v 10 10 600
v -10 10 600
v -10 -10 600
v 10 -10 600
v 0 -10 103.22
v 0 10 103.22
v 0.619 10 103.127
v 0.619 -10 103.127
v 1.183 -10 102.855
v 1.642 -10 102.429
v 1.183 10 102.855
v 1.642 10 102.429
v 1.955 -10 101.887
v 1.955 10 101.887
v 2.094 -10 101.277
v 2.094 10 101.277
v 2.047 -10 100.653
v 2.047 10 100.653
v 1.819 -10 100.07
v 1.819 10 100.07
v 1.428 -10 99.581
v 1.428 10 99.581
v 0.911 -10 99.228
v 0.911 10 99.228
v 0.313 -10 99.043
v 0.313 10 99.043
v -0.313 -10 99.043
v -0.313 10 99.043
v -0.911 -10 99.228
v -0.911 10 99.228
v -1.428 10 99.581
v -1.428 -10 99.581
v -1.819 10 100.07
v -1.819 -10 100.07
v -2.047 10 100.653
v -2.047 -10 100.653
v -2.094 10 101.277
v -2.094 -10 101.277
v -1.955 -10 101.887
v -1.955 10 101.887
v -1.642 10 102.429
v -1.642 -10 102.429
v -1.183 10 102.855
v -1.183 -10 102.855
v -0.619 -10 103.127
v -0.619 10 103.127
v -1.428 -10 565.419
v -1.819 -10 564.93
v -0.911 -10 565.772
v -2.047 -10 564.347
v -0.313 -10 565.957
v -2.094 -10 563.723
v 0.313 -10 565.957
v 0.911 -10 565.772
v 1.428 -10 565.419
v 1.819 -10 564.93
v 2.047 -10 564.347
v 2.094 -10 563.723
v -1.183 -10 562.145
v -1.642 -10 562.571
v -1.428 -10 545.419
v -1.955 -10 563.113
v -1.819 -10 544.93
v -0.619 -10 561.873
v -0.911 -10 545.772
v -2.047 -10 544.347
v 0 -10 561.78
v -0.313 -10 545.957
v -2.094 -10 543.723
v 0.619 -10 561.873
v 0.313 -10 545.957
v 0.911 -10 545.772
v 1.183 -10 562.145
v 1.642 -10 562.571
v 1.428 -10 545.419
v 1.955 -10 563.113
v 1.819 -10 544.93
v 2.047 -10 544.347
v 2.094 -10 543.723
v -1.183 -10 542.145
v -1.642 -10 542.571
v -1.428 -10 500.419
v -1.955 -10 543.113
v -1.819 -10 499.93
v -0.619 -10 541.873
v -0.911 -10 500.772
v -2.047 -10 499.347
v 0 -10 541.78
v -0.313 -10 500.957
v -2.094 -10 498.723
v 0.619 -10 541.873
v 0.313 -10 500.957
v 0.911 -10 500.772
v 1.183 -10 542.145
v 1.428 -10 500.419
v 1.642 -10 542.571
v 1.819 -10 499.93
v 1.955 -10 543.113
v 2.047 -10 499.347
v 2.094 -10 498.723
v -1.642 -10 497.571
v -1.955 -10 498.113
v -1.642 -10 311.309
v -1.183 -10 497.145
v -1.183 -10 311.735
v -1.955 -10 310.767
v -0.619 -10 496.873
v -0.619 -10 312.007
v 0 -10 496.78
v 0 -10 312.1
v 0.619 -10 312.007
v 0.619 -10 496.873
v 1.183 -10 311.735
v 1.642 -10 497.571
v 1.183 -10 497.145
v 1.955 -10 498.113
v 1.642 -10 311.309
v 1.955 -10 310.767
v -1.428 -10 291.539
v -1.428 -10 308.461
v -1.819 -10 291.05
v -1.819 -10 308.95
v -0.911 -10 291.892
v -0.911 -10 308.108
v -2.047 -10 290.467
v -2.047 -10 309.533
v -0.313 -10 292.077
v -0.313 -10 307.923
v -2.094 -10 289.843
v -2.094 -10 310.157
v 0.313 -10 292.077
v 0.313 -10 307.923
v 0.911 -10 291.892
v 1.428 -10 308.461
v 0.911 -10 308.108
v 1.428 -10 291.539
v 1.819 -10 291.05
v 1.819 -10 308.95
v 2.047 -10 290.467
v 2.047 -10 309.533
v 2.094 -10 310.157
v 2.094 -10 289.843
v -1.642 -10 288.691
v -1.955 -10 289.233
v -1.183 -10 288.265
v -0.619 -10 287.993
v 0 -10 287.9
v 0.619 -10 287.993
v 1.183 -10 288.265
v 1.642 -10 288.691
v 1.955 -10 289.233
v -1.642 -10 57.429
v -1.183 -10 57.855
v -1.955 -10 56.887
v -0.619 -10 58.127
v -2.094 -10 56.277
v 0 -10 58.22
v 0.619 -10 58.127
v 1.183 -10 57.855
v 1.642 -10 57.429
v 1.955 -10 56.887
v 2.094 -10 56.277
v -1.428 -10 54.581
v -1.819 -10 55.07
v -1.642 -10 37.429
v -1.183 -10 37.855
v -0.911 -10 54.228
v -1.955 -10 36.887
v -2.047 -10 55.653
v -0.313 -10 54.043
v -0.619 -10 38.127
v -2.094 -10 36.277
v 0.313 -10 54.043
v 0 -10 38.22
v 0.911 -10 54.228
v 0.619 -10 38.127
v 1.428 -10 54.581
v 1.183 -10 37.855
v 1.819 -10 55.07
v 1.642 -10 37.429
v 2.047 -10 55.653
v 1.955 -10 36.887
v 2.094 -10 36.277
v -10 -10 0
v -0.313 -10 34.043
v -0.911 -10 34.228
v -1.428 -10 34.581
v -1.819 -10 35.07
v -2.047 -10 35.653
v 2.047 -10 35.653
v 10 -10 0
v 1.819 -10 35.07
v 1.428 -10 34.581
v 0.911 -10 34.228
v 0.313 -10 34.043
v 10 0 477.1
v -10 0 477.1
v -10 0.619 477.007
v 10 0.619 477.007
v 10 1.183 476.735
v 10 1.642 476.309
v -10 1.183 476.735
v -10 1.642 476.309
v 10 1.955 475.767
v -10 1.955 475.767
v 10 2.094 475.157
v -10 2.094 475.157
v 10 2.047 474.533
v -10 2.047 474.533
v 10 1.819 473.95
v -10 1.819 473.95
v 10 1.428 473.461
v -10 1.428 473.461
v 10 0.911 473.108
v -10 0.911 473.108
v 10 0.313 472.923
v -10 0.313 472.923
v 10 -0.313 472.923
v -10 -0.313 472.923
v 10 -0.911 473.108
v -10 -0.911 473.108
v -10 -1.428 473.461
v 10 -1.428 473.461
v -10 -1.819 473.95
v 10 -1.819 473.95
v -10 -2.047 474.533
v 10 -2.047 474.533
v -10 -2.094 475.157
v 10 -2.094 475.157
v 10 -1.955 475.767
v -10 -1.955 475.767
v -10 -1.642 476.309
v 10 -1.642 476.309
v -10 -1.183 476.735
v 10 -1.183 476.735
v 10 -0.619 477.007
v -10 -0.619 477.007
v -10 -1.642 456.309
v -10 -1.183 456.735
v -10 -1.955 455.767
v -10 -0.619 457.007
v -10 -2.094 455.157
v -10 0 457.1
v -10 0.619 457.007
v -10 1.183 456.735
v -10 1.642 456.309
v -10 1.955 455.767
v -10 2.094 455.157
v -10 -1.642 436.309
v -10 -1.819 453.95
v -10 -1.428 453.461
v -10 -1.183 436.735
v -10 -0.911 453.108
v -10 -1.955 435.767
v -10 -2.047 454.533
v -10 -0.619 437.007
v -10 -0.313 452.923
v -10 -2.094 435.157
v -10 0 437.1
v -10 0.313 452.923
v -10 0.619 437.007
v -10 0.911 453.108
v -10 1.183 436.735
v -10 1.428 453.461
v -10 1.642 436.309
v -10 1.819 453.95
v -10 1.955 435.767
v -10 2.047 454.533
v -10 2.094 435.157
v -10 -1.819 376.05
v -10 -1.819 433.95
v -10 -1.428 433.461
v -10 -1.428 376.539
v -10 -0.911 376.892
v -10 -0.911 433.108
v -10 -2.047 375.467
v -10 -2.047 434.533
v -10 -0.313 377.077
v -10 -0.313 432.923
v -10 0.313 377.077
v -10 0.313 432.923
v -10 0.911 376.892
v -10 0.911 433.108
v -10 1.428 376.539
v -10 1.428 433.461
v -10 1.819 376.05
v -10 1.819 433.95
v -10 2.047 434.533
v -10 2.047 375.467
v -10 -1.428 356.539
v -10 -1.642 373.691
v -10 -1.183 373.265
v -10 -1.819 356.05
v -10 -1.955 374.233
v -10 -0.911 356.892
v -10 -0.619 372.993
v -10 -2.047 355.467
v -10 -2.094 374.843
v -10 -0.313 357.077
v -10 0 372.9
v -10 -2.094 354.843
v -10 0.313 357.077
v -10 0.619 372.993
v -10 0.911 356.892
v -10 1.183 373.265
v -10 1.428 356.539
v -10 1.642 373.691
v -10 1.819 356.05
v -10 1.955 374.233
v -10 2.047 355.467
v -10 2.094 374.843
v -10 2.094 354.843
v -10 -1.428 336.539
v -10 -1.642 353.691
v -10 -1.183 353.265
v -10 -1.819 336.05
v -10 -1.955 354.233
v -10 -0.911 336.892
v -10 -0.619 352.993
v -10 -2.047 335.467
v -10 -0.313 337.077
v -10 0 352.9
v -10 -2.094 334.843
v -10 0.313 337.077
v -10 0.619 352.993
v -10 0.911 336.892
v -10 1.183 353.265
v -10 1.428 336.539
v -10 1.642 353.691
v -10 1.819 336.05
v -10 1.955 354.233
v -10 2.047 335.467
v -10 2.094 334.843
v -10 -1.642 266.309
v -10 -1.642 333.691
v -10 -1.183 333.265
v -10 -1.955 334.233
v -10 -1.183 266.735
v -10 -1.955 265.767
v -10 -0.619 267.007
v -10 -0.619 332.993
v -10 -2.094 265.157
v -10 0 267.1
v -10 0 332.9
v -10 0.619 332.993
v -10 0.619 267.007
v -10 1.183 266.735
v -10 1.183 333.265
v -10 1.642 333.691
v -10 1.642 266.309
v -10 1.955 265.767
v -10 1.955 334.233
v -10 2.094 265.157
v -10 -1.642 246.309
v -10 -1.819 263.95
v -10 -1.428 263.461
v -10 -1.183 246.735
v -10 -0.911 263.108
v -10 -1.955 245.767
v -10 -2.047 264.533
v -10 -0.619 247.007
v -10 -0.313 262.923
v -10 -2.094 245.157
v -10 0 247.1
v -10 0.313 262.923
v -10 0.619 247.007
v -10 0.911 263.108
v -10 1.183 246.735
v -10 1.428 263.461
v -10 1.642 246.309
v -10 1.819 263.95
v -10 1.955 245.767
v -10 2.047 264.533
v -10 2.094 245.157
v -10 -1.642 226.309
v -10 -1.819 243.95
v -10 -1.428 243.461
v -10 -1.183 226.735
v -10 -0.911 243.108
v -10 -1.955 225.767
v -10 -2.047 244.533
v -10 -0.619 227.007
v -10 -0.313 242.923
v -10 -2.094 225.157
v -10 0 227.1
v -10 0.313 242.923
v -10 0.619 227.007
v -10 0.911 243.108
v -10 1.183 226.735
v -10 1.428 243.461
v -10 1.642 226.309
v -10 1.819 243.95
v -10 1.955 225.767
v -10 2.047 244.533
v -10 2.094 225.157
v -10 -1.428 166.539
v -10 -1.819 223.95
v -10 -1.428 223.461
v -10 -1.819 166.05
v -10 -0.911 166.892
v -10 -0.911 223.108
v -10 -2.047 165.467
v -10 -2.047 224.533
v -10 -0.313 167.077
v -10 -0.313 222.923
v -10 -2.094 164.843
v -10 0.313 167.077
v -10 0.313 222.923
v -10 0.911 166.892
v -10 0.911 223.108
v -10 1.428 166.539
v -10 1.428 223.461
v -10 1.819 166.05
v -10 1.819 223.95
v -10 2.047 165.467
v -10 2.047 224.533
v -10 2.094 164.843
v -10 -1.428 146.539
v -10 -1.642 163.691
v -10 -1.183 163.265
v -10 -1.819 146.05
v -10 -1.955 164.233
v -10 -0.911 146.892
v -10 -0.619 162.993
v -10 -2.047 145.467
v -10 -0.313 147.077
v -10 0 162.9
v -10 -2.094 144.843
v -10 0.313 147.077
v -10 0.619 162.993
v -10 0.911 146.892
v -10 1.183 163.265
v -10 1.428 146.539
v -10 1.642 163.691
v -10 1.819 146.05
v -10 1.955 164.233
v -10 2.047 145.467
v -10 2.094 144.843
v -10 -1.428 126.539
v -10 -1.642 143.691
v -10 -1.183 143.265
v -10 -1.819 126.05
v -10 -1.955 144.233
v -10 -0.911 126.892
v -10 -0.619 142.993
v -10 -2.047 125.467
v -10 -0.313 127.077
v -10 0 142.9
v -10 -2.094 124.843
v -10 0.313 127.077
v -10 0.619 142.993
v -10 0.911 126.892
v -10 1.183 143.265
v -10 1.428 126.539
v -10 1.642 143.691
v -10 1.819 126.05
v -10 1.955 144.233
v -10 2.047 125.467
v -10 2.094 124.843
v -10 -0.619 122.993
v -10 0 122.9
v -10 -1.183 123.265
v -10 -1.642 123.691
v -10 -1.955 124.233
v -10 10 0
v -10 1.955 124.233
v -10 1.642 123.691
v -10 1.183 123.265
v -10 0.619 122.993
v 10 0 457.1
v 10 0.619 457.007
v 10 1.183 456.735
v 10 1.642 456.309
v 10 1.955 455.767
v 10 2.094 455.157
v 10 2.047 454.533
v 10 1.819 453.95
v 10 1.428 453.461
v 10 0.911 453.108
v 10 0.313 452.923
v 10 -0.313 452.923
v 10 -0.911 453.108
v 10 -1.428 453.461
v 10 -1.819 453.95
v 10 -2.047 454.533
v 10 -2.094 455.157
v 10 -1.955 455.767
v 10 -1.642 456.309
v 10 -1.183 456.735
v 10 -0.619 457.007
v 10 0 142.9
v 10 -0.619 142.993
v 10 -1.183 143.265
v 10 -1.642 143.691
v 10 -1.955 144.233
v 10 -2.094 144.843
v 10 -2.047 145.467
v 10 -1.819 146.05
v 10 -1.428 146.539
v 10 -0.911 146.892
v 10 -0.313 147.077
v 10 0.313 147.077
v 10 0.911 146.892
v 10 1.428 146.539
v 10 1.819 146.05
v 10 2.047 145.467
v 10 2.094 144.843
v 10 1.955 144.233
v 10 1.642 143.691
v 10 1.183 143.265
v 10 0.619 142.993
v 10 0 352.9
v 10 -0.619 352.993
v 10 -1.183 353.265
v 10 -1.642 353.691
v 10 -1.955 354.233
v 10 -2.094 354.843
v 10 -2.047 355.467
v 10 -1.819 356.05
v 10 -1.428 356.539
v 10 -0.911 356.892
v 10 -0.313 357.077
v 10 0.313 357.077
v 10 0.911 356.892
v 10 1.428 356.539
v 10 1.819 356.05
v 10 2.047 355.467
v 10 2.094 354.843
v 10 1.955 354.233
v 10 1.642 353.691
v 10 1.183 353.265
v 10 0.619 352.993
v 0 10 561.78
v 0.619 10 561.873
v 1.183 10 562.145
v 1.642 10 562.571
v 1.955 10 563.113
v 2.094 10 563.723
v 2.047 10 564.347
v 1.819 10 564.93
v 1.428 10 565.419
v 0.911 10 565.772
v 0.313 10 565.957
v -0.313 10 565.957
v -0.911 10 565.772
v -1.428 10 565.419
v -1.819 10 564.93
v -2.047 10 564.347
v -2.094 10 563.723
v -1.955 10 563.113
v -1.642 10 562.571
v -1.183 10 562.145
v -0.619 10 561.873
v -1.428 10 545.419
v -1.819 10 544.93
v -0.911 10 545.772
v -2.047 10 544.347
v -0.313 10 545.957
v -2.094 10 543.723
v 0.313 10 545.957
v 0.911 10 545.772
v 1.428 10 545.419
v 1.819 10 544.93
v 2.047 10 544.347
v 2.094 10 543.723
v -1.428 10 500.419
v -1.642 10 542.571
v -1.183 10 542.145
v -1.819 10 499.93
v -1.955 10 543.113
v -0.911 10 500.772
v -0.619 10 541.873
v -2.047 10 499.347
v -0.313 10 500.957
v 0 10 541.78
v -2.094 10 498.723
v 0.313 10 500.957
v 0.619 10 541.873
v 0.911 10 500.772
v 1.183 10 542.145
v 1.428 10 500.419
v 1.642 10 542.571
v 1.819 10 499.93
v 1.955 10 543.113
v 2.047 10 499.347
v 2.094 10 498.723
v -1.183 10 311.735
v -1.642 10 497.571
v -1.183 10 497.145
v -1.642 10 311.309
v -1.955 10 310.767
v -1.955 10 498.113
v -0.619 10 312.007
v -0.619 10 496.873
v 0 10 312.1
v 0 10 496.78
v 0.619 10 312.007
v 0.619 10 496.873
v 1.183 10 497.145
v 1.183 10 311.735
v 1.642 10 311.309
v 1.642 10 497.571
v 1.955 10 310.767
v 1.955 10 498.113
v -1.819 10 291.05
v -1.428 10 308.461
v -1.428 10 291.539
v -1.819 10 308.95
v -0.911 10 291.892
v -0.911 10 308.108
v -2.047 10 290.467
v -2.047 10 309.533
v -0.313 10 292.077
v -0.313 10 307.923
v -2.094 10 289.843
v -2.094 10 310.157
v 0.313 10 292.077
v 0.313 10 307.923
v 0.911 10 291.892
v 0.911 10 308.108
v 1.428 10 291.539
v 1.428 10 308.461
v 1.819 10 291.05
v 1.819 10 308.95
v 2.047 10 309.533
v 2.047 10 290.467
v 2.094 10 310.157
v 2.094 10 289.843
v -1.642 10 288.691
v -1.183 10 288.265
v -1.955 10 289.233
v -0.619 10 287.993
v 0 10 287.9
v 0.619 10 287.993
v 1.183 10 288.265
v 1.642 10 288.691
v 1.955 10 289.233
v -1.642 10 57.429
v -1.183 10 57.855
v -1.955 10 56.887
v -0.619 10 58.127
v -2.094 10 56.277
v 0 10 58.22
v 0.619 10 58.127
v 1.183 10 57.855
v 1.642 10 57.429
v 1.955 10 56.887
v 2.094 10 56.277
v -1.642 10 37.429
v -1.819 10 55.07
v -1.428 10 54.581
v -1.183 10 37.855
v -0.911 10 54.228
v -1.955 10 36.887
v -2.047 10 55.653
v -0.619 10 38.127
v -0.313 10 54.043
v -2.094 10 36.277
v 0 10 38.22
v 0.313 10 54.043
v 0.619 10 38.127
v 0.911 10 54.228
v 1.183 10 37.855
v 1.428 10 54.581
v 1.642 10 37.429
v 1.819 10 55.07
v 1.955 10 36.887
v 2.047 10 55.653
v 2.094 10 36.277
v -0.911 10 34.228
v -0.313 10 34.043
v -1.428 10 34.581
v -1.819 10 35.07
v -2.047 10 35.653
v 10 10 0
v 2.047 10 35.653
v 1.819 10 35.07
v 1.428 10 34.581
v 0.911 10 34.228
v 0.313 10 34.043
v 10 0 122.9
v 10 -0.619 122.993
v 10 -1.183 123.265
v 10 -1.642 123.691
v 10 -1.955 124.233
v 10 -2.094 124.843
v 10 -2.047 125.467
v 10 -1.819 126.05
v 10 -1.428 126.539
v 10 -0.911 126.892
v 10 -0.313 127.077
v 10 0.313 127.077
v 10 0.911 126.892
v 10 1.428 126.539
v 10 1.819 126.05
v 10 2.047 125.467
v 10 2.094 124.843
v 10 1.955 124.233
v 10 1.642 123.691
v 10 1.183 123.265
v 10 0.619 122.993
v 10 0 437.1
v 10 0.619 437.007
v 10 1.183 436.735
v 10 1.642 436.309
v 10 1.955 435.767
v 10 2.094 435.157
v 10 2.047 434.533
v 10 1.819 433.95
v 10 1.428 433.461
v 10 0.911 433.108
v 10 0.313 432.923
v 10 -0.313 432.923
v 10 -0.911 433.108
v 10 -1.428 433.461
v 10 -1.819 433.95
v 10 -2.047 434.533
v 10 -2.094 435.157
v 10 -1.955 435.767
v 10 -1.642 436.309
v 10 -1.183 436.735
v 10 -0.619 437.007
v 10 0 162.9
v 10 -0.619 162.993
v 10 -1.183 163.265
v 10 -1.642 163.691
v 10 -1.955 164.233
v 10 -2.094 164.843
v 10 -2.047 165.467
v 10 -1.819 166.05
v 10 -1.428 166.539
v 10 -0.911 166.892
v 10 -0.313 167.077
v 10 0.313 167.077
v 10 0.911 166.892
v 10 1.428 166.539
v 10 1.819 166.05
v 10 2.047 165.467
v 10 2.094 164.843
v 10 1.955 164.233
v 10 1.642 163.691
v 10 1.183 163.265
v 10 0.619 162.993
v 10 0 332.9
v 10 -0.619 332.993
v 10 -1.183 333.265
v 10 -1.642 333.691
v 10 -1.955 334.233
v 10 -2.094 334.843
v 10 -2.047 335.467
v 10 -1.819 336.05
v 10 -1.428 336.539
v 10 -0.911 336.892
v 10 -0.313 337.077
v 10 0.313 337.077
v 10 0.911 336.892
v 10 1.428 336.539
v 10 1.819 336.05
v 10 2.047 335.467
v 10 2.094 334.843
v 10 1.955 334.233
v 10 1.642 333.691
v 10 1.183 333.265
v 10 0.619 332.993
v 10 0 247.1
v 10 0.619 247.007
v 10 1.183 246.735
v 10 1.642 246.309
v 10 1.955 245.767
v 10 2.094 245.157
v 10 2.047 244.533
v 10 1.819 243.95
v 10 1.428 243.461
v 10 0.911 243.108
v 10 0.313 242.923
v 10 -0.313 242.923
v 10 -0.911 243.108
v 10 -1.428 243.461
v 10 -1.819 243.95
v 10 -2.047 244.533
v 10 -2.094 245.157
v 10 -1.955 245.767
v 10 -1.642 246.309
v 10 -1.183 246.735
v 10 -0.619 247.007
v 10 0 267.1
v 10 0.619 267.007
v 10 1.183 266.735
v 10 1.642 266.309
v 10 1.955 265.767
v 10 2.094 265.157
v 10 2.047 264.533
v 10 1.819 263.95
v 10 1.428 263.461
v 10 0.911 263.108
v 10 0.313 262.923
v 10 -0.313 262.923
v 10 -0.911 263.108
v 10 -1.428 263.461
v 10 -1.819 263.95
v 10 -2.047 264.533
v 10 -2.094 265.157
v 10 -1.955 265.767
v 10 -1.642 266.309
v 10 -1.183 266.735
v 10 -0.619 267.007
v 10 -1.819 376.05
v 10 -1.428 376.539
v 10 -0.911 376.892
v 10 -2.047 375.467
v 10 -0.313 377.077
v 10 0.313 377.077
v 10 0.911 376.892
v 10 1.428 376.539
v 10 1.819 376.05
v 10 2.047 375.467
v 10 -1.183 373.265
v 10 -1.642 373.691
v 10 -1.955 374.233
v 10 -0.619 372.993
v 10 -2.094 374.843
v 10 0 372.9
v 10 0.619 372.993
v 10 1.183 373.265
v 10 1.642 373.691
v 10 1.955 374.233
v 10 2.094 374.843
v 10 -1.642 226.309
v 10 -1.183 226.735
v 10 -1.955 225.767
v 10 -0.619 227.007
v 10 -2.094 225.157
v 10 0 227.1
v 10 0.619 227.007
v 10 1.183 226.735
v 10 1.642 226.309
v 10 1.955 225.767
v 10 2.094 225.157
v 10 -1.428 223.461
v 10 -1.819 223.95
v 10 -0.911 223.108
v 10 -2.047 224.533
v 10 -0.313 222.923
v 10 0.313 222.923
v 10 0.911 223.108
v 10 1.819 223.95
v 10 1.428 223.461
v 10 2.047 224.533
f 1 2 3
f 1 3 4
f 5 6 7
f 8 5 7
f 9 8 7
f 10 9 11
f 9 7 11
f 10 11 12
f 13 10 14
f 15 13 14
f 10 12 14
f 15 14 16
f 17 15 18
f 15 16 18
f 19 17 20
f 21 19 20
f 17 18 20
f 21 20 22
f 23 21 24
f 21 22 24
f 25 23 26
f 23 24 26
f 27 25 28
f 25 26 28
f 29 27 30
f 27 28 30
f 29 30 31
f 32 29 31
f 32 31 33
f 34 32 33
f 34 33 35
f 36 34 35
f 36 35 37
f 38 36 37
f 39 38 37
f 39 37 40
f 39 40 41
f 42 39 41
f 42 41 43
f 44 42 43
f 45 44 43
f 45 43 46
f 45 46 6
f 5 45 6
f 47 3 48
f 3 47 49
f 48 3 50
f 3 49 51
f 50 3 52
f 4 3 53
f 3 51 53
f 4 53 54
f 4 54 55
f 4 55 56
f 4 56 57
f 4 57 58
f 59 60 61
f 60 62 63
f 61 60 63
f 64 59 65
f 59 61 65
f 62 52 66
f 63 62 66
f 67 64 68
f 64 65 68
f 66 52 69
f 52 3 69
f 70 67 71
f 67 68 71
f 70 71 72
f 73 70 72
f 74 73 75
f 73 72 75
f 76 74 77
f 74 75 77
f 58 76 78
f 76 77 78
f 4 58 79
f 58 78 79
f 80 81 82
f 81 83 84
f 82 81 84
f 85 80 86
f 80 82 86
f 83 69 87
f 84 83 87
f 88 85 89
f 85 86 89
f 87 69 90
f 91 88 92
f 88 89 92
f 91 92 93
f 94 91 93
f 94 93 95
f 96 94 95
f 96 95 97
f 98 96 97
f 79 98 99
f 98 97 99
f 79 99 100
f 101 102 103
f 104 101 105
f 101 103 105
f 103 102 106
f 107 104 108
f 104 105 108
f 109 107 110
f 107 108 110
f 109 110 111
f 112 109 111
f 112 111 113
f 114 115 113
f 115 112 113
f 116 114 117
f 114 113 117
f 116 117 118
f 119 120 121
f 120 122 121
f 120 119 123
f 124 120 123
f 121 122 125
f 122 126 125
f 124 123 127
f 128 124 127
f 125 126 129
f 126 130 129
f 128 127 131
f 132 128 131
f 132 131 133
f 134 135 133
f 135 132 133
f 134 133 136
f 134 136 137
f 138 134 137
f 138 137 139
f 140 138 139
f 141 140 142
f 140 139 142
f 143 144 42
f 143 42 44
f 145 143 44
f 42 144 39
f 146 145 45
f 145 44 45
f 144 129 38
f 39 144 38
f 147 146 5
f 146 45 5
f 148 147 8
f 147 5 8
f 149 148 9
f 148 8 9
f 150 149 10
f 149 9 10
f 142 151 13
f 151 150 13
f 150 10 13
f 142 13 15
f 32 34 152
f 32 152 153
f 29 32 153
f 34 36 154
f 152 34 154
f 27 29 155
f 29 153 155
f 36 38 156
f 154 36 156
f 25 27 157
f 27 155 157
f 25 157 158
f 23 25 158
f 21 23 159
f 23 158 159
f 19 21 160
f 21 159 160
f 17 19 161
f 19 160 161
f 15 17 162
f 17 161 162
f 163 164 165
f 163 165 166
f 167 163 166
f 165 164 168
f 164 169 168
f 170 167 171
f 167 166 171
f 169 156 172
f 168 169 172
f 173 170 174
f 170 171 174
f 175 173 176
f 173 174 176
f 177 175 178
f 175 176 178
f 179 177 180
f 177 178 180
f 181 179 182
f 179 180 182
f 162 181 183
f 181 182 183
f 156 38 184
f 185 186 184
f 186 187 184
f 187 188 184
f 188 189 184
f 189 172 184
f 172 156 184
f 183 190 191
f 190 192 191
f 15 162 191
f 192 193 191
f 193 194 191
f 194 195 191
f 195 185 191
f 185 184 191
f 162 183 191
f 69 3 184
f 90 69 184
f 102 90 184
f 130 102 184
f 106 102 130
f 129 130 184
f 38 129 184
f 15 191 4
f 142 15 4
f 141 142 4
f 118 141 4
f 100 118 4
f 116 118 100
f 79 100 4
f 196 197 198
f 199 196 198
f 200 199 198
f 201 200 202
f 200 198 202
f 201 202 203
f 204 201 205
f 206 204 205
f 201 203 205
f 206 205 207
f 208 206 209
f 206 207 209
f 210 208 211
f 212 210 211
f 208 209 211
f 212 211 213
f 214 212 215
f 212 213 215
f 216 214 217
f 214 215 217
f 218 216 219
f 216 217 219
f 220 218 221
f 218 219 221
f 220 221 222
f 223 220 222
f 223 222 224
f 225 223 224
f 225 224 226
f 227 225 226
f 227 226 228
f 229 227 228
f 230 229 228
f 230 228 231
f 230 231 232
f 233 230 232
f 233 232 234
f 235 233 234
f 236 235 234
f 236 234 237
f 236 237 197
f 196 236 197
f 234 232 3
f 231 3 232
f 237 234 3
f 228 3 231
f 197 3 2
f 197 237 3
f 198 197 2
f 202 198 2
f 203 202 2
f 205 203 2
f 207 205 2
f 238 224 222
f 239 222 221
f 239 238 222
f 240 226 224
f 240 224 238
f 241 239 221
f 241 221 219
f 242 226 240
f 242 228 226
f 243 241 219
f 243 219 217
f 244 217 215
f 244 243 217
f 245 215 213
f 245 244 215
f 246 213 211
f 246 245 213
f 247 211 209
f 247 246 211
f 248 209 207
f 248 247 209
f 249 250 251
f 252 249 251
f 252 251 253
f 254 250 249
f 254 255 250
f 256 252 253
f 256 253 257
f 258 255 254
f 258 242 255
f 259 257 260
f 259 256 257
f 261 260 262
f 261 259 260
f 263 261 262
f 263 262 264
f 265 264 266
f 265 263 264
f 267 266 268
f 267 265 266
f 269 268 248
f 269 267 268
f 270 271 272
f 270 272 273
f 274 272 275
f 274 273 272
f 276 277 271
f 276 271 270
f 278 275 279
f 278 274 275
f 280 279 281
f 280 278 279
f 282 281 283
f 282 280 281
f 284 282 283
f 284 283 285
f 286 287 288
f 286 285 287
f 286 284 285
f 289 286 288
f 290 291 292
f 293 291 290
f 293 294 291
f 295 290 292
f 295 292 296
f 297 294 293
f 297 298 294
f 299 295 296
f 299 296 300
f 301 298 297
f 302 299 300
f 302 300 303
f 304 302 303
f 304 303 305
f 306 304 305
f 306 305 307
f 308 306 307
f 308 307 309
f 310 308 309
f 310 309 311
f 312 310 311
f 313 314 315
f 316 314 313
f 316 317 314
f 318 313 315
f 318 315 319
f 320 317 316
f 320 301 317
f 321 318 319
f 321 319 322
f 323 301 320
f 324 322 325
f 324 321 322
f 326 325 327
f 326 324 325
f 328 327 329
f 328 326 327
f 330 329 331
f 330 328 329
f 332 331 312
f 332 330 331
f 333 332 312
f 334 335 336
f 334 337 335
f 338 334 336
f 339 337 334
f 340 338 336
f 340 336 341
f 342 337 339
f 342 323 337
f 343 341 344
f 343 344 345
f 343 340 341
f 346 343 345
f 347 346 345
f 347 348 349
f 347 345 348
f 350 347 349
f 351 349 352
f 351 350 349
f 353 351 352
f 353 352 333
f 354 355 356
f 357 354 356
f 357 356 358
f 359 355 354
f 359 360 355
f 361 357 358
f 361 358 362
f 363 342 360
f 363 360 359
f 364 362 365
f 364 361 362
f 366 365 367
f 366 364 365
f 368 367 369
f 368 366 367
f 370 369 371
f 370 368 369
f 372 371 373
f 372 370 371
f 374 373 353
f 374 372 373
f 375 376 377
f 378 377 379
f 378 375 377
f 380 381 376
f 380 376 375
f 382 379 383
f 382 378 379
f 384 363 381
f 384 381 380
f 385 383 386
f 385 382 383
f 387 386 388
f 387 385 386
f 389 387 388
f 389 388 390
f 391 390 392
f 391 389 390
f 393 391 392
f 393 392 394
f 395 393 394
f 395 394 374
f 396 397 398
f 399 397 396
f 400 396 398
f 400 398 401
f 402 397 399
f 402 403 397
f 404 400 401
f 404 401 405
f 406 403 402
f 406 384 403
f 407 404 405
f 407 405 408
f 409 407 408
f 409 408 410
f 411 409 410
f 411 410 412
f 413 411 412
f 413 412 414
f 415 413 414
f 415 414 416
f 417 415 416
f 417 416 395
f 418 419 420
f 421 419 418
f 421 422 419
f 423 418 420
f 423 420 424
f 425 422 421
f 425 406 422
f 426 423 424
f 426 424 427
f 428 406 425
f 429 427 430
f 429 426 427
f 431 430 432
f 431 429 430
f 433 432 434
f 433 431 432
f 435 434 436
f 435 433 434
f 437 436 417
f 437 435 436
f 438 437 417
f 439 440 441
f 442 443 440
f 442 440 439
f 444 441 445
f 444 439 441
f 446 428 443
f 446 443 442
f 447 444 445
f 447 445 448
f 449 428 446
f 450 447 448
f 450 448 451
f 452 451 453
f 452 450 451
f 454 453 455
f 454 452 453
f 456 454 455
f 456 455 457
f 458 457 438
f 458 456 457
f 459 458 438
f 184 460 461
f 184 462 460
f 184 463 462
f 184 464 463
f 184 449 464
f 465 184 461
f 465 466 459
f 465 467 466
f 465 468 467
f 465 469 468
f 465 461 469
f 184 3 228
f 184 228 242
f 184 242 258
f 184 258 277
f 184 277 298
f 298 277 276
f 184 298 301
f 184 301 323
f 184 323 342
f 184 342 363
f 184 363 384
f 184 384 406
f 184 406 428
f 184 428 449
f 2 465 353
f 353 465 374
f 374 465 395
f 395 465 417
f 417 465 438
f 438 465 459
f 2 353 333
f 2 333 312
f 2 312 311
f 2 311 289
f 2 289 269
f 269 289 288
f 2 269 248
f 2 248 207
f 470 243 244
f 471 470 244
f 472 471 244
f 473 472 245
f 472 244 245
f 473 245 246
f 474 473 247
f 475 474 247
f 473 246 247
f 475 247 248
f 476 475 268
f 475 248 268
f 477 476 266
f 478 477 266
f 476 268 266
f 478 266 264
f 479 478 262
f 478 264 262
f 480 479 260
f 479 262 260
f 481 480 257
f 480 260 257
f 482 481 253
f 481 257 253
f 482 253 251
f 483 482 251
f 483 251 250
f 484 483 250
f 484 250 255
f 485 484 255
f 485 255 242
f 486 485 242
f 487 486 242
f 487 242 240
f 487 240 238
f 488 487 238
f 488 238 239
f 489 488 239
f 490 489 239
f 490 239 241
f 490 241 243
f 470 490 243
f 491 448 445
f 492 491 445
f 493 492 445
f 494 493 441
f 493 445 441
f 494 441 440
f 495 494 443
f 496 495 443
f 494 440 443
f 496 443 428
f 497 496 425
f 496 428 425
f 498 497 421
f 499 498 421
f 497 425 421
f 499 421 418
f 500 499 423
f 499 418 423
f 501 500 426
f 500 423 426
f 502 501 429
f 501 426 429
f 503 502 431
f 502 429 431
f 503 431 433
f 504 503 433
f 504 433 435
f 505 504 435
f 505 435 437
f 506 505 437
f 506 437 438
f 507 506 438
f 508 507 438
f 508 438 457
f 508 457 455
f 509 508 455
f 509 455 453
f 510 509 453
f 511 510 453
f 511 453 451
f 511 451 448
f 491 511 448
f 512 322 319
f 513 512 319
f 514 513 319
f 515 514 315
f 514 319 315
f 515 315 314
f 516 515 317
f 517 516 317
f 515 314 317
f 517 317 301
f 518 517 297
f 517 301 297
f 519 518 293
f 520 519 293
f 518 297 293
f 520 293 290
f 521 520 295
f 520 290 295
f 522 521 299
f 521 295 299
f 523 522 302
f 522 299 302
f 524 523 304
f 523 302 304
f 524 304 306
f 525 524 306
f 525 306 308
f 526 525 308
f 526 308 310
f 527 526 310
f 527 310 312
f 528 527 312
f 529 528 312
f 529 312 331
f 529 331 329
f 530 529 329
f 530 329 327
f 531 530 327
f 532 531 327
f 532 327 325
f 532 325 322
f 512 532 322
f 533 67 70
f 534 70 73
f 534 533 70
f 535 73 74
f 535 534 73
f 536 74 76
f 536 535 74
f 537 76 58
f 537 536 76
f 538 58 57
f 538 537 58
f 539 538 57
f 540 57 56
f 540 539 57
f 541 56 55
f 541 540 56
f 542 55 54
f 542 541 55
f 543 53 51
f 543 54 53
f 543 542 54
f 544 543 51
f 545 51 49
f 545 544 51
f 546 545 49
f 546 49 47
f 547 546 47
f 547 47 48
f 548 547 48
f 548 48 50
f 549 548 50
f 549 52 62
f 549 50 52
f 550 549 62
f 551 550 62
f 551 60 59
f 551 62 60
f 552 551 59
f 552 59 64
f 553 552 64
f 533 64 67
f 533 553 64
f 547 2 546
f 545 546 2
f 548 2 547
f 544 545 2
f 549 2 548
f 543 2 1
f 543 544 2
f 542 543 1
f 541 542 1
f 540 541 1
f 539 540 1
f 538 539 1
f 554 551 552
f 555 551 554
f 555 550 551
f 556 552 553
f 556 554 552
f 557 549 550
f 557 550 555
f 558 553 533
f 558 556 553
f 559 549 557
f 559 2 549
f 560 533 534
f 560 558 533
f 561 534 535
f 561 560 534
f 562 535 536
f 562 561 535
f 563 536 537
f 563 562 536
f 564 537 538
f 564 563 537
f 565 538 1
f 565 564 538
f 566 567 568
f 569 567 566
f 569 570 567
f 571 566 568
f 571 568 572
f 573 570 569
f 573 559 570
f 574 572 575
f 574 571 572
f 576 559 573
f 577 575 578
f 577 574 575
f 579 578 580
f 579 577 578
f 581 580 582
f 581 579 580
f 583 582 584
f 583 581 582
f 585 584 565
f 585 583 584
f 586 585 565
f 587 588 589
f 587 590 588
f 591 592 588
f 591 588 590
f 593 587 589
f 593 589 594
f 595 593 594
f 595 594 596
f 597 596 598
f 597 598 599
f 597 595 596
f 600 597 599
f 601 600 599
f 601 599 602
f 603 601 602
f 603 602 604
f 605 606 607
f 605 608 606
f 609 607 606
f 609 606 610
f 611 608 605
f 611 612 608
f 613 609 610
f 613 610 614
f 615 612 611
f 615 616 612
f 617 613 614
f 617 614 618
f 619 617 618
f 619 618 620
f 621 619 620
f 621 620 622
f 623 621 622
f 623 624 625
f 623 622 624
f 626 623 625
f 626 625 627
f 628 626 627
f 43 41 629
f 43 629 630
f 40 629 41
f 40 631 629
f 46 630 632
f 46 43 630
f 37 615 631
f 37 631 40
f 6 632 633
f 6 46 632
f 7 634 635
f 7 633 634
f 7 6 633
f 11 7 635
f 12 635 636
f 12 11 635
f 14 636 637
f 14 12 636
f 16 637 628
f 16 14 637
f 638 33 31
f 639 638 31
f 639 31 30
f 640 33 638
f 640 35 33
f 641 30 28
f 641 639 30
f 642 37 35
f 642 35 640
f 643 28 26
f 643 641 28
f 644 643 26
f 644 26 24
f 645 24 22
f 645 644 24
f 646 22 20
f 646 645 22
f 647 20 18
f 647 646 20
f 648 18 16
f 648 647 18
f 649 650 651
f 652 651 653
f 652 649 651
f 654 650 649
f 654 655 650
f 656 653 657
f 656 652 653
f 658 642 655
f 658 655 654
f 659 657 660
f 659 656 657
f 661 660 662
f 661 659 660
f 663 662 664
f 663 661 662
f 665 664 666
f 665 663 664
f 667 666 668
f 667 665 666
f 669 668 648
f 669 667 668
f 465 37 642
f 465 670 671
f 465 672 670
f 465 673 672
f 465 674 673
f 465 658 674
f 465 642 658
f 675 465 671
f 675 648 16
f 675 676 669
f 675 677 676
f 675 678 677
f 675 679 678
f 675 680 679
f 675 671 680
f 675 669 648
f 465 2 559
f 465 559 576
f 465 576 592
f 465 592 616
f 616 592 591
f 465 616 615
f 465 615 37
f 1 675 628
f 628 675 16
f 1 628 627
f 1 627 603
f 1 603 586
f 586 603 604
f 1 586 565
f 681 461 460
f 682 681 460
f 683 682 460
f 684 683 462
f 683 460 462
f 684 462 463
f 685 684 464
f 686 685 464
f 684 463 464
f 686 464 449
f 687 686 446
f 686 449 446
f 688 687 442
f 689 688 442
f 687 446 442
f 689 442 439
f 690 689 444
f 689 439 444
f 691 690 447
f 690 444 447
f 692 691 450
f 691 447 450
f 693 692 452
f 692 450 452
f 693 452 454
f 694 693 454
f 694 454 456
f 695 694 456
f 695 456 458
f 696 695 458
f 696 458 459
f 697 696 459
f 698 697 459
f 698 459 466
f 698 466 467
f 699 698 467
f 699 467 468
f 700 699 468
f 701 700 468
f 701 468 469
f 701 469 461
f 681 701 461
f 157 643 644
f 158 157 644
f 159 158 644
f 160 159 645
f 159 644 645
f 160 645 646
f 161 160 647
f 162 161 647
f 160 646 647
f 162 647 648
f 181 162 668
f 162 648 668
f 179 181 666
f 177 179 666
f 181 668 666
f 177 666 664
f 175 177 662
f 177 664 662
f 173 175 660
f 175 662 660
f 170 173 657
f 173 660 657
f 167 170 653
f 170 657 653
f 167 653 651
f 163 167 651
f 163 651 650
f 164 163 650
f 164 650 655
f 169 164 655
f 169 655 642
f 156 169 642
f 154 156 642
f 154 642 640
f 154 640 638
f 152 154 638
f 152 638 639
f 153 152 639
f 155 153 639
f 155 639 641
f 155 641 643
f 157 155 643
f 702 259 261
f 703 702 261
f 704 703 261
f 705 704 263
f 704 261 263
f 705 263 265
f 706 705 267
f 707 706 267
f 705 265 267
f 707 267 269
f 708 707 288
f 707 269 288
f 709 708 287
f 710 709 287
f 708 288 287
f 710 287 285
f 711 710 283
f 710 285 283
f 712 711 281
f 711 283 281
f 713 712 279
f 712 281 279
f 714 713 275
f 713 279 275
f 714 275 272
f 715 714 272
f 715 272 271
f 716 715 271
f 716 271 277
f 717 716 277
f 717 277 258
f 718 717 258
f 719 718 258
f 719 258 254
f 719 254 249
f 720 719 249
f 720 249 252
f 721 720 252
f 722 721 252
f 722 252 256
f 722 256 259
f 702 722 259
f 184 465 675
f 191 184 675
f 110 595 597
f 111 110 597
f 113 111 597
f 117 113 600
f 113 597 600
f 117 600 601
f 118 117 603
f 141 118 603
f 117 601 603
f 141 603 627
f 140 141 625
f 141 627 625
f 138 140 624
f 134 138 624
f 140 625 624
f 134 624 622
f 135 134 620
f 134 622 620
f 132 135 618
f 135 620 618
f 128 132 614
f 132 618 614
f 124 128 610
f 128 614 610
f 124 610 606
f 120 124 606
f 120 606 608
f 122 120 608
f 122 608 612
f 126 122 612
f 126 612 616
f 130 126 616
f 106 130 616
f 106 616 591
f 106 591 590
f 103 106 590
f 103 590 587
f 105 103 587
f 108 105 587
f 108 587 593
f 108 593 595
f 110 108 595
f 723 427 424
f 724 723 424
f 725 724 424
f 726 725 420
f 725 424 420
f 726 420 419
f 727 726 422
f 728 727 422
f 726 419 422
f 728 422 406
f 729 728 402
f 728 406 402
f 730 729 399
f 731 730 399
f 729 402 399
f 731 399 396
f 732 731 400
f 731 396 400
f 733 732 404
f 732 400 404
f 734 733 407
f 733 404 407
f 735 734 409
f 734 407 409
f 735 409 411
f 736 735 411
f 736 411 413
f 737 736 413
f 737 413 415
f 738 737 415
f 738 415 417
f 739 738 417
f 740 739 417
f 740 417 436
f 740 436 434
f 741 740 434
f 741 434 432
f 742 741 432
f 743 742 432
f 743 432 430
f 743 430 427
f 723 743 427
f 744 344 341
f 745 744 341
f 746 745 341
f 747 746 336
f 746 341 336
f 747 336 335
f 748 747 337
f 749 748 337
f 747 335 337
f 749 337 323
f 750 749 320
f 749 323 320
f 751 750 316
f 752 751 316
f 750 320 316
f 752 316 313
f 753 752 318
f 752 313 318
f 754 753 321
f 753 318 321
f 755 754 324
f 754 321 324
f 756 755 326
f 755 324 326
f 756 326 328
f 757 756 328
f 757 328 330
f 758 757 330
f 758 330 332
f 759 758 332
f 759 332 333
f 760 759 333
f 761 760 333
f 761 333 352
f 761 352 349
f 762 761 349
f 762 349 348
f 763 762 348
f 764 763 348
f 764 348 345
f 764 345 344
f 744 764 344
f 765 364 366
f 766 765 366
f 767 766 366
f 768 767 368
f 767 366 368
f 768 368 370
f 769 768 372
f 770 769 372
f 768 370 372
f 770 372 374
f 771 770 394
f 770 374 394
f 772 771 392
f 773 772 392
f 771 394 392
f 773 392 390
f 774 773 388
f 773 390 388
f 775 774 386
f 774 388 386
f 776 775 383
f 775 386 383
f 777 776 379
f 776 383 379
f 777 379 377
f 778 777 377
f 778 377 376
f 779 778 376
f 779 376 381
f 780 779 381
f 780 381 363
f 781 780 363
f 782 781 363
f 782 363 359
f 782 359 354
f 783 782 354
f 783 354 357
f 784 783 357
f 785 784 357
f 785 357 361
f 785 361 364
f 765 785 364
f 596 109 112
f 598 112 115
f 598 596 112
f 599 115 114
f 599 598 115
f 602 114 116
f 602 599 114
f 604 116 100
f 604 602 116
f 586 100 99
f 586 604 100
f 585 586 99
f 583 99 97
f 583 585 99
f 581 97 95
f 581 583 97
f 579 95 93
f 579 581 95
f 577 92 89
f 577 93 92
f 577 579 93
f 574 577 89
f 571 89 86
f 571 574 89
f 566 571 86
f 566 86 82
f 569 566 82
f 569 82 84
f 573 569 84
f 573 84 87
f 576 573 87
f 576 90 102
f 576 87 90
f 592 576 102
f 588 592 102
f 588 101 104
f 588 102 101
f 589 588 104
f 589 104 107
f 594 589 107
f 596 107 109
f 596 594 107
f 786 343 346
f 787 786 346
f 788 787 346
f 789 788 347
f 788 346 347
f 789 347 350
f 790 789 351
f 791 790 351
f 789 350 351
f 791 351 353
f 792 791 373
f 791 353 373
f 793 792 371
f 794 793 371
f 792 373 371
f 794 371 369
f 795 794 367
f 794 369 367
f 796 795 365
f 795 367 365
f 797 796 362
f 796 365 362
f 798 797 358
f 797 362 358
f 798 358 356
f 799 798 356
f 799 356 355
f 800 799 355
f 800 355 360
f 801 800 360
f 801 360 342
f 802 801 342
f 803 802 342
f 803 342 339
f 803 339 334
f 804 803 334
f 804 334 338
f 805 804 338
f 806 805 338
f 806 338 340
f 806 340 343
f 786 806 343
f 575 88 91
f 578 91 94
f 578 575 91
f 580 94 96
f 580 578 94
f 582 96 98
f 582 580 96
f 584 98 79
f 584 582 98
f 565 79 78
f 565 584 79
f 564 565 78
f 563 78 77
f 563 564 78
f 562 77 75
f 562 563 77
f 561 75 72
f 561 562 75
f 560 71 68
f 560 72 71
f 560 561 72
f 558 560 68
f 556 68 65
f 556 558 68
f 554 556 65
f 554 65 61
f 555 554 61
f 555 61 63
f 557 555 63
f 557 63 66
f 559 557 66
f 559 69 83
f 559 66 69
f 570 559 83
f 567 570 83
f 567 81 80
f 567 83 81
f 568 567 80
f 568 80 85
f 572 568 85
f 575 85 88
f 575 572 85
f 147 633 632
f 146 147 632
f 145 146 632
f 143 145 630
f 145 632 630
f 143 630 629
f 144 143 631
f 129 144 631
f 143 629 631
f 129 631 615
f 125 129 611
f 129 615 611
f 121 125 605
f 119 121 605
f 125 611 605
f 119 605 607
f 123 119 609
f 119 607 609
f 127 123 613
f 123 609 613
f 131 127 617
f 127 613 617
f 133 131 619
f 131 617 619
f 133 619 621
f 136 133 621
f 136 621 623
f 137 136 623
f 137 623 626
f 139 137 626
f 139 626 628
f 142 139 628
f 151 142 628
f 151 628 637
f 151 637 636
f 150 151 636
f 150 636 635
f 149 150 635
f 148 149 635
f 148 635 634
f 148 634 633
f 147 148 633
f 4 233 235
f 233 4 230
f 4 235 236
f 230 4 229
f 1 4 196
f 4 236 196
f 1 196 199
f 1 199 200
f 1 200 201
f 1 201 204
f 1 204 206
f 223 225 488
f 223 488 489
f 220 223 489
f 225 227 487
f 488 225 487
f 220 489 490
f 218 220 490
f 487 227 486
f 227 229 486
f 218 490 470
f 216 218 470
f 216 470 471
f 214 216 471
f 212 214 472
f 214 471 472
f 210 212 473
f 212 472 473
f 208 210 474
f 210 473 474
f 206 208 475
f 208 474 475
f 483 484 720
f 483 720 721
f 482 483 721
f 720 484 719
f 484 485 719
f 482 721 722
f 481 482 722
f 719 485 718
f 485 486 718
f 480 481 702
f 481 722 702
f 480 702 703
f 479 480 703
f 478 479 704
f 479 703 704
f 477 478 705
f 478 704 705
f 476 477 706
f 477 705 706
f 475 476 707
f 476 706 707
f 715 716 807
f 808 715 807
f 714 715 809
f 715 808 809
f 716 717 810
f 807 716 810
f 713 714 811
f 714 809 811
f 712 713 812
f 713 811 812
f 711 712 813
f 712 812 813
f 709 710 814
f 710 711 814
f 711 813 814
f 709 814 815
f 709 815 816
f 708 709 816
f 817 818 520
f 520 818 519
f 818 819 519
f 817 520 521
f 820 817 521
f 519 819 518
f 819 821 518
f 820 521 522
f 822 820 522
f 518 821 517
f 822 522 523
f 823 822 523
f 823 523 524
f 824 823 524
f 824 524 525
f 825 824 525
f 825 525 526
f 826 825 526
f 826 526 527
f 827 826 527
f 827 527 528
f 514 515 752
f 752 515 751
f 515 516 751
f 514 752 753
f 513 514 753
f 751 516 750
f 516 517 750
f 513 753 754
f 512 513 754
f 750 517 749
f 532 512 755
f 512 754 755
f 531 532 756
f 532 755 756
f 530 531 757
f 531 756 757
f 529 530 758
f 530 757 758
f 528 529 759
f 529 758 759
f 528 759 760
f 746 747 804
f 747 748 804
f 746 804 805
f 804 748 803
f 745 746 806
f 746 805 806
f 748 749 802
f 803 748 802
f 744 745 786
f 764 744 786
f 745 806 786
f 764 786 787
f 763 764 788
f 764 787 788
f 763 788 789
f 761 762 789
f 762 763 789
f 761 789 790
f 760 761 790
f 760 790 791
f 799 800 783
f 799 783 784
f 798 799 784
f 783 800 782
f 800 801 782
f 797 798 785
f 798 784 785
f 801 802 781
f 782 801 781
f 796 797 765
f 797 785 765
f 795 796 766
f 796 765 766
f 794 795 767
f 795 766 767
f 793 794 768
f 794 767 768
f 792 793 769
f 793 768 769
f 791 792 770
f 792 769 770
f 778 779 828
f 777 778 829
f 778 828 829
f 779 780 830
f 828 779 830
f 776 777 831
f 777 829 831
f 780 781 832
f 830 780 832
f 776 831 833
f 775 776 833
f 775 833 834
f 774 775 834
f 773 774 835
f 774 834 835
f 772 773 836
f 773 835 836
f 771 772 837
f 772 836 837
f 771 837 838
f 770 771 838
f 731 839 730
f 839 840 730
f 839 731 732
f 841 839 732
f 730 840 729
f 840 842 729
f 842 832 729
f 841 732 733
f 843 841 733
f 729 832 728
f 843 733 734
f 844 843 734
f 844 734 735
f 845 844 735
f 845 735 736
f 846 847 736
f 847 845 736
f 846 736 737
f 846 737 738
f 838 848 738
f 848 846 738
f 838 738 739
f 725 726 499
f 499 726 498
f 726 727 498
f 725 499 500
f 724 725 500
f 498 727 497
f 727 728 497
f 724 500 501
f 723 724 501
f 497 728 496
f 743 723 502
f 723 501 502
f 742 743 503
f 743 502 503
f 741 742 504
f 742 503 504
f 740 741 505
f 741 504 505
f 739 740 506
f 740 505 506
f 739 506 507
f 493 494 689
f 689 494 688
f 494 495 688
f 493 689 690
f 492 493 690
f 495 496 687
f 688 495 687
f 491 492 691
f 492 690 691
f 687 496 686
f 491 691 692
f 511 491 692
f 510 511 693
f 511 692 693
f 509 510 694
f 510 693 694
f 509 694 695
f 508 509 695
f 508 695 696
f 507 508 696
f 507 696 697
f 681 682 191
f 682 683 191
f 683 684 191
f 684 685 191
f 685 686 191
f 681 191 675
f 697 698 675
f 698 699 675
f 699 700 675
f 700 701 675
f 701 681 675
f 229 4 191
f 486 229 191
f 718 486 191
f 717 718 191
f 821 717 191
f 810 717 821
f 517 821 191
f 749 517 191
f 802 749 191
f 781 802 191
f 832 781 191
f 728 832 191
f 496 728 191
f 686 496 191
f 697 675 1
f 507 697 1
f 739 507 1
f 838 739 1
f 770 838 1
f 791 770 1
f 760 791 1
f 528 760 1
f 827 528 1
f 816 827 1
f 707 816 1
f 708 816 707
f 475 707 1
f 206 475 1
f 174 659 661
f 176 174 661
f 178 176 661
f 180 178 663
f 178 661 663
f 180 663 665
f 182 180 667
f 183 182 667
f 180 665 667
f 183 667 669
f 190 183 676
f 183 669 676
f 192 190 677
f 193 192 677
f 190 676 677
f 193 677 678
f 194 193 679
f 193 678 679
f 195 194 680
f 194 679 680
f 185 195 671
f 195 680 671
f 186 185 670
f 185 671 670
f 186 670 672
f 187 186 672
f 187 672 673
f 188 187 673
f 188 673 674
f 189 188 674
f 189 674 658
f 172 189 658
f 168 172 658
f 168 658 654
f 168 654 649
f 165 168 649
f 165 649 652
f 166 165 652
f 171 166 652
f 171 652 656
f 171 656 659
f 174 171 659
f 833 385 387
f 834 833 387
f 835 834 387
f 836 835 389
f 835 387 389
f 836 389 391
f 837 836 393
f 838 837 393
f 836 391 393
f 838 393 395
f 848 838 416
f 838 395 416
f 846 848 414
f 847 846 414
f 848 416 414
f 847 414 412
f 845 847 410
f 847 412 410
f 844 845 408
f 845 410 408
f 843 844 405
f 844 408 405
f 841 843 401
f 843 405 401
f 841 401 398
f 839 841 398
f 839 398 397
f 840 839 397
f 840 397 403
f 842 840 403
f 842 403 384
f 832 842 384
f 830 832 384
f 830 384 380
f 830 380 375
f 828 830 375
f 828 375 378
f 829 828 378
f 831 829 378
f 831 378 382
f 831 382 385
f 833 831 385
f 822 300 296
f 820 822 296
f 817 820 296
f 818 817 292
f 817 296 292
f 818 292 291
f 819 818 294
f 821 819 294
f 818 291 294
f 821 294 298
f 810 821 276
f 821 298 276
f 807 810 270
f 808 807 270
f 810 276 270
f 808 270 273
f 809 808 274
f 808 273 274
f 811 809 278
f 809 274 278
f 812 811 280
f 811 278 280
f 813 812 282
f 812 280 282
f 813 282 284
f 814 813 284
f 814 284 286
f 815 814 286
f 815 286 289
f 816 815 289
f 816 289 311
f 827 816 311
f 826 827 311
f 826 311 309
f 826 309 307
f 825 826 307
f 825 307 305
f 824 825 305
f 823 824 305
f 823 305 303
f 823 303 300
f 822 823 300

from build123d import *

# Parameters (mm, degrees)
SKETCH_1_W          = 20
SKETCH_1_H          = 20
EXTRUDE_1_DEPTH     = 600
SKETCH_2_R          = 2.1
CUT_EXTRUDE_1_DEPTH = 30
SKETCH_3_R          = 2.1
CUT_EXTRUDE_2_DEPTH = 601.416522091
SKETCH_4_R          = 2.1
CUT_EXTRUDE_3_DEPTH = 601.416522091


with BuildPart() as part:
    # 草图1 → 凸台-拉伸1 (new body)
    with BuildSketch(Plane.XY):
        Rectangle(SKETCH_1_W, SKETCH_1_H)
    extrude(amount=EXTRUDE_1_DEPTH)

    # 草图2 → 切除-拉伸1 (cut)
    with BuildSketch(Plane(origin=(0, 10, 0), x_dir=(1, 0, 0), z_dir=(0, 1, 0))):
        with Locations(Location((0, -36.12, 0), (0, 0, 270))):
            Circle(SKETCH_2_R)
        with Locations(Location((0, -56.12, 0), (0, 0, 270))):
            Circle(SKETCH_2_R)
        with Locations(Location((0, -101.12, 0), (0, 0, 270))):
            Circle(SKETCH_2_R)
    cut_extrude_1 = extrude(amount=-CUT_EXTRUDE_1_DEPTH, mode=Mode.SUBTRACT)

    # 镜向1: 切除-拉伸1 across plane
    add(cut_extrude_1.mirror(Plane(origin=(0, 0, 300), x_dir=(1, 0, 0), z_dir=(0, 0, -1))), mode=Mode.SUBTRACT)

    # 草图3 → 切除-拉伸2 (cut, through all)
    with BuildSketch(Plane.ZY.offset(10)):
        with Locations((225, 0)):
            Circle(SKETCH_3_R)
        with Locations((245, 0)):
            Circle(SKETCH_3_R)
        with Locations((265, 0)):
            Circle(SKETCH_3_R)
        with Locations(Location((375, 0, 0), (0, 0, 180))):
            Circle(SKETCH_3_R)
        with Locations(Location((355, 0, 0), (0, 0, 180))):
            Circle(SKETCH_3_R)
        with Locations(Location((335, 0, 0), (0, 0, 180))):
            Circle(SKETCH_3_R)
        with Locations((435, 0)):
            Circle(SKETCH_3_R)
        with Locations((455, 0)):
            Circle(SKETCH_3_R)
        with Locations((475, 0)):
            Circle(SKETCH_3_R)
        with Locations(Location((125, 0, 0), (0, 0, 180))):
            Circle(SKETCH_3_R)
        with Locations(Location((145, 0, 0), (0, 0, 180))):
            Circle(SKETCH_3_R)
        with Locations(Location((165, 0, 0), (0, 0, 180))):
            Circle(SKETCH_3_R)
    extrude(amount=-CUT_EXTRUDE_2_DEPTH, mode=Mode.SUBTRACT)

    # 草图4 → 切除-拉伸3 (cut, through all)
    with BuildSketch(Plane(origin=(0, 10, 0), x_dir=(1, 0, 0), z_dir=(0, 1, 0))):
        with Locations(Location((0, -310, 0), (0, 0, 270))):
            Circle(SKETCH_4_R)
        with Locations(Location((0, -290, 0), (0, 0, 90))):
            Circle(SKETCH_4_R)
    extrude(amount=-CUT_EXTRUDE_3_DEPTH, mode=Mode.SUBTRACT)


solid = part.part
